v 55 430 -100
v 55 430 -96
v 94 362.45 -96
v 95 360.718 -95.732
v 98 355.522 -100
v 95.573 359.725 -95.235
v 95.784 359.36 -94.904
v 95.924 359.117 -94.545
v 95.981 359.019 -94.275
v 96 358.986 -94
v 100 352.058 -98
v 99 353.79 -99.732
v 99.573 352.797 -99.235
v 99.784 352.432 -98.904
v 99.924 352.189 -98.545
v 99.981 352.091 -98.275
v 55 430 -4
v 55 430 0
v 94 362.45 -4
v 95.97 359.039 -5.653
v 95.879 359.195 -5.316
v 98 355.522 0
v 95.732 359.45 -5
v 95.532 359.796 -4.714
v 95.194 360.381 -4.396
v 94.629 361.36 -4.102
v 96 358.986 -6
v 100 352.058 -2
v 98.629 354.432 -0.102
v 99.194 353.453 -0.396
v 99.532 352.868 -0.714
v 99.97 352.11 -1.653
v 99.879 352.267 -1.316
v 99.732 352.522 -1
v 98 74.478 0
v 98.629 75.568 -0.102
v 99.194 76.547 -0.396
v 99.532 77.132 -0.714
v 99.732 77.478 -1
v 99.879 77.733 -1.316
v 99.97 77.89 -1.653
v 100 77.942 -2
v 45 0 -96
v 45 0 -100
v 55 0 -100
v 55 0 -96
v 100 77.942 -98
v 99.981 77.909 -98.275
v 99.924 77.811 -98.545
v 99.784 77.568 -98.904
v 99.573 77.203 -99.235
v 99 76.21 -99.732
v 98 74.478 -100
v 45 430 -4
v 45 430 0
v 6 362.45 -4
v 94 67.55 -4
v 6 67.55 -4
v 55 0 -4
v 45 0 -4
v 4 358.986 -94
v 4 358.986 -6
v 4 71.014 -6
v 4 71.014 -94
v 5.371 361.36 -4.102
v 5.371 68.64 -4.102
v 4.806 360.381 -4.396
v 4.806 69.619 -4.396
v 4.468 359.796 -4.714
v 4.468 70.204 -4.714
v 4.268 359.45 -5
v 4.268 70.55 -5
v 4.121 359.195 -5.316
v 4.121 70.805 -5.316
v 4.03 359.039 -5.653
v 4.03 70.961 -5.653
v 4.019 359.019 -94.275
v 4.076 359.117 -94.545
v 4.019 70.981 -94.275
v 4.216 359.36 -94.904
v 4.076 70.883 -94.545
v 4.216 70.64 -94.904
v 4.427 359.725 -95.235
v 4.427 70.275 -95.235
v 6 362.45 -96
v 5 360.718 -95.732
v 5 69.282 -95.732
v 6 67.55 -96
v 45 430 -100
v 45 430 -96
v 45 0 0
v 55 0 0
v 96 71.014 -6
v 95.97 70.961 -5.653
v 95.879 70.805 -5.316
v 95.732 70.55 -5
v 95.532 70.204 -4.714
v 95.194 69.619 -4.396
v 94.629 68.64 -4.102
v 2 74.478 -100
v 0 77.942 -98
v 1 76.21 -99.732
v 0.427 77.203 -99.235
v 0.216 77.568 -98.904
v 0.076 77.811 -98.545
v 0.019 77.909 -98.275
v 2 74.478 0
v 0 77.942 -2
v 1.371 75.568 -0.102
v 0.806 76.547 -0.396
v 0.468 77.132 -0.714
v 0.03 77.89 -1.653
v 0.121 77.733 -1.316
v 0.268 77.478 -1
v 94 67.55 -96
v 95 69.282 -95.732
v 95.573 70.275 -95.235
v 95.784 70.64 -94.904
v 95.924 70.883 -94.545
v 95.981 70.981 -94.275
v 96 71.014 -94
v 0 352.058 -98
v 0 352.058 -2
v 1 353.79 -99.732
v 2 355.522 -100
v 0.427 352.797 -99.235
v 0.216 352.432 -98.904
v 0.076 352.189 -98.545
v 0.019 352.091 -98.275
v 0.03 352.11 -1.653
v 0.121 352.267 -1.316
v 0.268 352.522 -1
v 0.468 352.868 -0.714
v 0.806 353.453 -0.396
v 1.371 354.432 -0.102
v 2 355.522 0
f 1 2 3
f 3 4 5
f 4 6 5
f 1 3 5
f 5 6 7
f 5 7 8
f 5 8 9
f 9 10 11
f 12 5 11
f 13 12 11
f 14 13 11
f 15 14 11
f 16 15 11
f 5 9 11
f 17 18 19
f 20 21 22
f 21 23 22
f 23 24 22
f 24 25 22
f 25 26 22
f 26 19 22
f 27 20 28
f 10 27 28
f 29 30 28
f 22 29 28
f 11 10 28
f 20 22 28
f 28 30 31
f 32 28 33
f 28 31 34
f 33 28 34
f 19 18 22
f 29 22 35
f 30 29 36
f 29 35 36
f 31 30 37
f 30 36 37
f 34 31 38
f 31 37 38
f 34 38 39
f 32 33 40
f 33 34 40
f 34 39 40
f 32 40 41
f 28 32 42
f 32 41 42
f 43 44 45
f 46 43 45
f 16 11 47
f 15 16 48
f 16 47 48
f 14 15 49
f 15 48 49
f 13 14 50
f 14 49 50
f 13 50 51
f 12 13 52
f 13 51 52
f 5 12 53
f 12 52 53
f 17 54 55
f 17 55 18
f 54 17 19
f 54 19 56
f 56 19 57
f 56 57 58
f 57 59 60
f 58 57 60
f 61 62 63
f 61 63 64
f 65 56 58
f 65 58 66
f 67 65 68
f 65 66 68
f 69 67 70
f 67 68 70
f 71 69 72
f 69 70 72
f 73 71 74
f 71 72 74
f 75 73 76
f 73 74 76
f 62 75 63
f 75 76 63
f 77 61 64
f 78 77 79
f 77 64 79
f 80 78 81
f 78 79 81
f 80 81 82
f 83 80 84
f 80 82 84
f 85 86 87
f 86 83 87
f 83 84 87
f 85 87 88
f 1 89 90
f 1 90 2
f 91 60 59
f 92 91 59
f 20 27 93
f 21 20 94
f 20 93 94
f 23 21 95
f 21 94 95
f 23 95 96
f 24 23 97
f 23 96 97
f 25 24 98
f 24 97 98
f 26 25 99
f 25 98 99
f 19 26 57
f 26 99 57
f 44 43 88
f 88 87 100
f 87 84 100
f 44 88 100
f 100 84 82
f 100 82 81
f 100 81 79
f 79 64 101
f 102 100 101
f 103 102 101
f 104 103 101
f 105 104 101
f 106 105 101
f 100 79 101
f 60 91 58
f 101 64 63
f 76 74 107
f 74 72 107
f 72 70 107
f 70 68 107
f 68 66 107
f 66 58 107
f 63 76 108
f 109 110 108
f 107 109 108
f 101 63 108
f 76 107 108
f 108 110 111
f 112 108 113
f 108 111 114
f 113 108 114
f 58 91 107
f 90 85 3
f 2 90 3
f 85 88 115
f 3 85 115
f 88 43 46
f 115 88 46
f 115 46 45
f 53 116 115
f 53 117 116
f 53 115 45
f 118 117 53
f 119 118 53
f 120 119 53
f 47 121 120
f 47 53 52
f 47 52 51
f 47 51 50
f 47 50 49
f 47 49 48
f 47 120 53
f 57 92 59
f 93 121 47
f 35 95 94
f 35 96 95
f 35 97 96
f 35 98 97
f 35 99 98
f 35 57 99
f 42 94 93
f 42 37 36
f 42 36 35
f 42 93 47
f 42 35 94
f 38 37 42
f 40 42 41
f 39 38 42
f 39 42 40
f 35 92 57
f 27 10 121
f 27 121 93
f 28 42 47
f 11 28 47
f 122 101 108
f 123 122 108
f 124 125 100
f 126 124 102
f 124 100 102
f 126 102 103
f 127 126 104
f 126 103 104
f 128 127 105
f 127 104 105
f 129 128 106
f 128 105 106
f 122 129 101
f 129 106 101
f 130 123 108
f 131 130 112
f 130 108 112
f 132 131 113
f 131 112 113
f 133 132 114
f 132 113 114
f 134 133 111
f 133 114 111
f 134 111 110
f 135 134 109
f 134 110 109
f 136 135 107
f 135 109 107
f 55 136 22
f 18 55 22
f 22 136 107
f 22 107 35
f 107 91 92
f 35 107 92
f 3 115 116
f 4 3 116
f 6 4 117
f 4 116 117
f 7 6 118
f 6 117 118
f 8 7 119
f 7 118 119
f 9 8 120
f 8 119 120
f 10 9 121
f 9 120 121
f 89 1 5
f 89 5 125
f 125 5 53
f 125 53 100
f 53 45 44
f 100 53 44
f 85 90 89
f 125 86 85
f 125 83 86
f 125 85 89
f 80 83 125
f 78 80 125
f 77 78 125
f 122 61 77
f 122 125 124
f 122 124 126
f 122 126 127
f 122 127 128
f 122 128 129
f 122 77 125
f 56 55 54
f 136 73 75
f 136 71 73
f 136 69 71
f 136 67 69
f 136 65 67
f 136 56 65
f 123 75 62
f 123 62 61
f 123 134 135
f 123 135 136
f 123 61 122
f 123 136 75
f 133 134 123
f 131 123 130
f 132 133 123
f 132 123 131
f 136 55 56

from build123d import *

# Parameters (mm, degrees)
BOSS_EXTRU_1_DEPTH      = 430
ENL_V_MAT_EXTRU_1_DEPTH = 453.65881191


with BuildPart() as part:
    # Esquisse2 → Boss.-Extru.1 (new body)
    with BuildSketch(Plane(origin=(0, 0, 0), x_dir=(1, 0, 0), z_dir=(0, 1, 0))):
        with BuildLine():
            Line((2, 0), (98, 0))
            ThreePointArc((98, 0), (99.414213562, 0.585786438), (100, 2))
            Line((100, 2), (100, 98))
            ThreePointArc((100, 98), (99.414213562, 99.414213562), (98, 100))
            Line((98, 100), (2, 100))
            ThreePointArc((2, 100), (0.585786438, 99.414213562), (0, 98))
            Line((0, 98), (0, 2))
            ThreePointArc((0, 2), (0.585786438, 0.585786438), (2, 0))
        make_face()
        with BuildLine():
            Line((6, 96), (94, 96))
            ThreePointArc((94, 96), (95.414213562, 95.414213562), (96, 94))
            Line((96, 94), (96, 6))
            ThreePointArc((96, 6), (95.414213562, 4.585786438), (94, 4))
            Line((94, 4), (6, 4))
            ThreePointArc((6, 4), (4.585786438, 4.585786438), (4, 6))
            Line((4, 6), (4, 94))
            ThreePointArc((4, 94), (4.585786438, 95.414213562), (6, 96))
        make_face(mode=Mode.SUBTRACT)
    extrude(amount=BOSS_EXTRU_1_DEPTH)

    # Esquisse3 → Enlèv. mat.-Extru.1 (cut, through all)
    with BuildSketch(Plane.XY):
        Polygon((45, 430), (0, 352.057713659), (-62.450183936, 352.057713659), (-62.450183936, 486.30167962), (45, 486.30167962), align=None)
        Polygon((45, 0), (0, 77.942286341), (-44.197295574, 77.942286341), (-44.197295574, -11.830713302), (45, -11.830713302), align=None)
        Polygon((55, -11.830713302), (55, 0), (100, 77.942286341), (144.197295574, 77.942286341), (144.197295574, -11.830713302), align=None)
        Polygon((55, 486.30167962), (55, 430), (100, 352.057713659), (162.450183936, 352.057713659), (162.450183936, 486.30167962), align=None)
    extrude(amount=-ENL_V_MAT_EXTRU_1_DEPTH, mode=Mode.SUBTRACT)


solid = part.part
